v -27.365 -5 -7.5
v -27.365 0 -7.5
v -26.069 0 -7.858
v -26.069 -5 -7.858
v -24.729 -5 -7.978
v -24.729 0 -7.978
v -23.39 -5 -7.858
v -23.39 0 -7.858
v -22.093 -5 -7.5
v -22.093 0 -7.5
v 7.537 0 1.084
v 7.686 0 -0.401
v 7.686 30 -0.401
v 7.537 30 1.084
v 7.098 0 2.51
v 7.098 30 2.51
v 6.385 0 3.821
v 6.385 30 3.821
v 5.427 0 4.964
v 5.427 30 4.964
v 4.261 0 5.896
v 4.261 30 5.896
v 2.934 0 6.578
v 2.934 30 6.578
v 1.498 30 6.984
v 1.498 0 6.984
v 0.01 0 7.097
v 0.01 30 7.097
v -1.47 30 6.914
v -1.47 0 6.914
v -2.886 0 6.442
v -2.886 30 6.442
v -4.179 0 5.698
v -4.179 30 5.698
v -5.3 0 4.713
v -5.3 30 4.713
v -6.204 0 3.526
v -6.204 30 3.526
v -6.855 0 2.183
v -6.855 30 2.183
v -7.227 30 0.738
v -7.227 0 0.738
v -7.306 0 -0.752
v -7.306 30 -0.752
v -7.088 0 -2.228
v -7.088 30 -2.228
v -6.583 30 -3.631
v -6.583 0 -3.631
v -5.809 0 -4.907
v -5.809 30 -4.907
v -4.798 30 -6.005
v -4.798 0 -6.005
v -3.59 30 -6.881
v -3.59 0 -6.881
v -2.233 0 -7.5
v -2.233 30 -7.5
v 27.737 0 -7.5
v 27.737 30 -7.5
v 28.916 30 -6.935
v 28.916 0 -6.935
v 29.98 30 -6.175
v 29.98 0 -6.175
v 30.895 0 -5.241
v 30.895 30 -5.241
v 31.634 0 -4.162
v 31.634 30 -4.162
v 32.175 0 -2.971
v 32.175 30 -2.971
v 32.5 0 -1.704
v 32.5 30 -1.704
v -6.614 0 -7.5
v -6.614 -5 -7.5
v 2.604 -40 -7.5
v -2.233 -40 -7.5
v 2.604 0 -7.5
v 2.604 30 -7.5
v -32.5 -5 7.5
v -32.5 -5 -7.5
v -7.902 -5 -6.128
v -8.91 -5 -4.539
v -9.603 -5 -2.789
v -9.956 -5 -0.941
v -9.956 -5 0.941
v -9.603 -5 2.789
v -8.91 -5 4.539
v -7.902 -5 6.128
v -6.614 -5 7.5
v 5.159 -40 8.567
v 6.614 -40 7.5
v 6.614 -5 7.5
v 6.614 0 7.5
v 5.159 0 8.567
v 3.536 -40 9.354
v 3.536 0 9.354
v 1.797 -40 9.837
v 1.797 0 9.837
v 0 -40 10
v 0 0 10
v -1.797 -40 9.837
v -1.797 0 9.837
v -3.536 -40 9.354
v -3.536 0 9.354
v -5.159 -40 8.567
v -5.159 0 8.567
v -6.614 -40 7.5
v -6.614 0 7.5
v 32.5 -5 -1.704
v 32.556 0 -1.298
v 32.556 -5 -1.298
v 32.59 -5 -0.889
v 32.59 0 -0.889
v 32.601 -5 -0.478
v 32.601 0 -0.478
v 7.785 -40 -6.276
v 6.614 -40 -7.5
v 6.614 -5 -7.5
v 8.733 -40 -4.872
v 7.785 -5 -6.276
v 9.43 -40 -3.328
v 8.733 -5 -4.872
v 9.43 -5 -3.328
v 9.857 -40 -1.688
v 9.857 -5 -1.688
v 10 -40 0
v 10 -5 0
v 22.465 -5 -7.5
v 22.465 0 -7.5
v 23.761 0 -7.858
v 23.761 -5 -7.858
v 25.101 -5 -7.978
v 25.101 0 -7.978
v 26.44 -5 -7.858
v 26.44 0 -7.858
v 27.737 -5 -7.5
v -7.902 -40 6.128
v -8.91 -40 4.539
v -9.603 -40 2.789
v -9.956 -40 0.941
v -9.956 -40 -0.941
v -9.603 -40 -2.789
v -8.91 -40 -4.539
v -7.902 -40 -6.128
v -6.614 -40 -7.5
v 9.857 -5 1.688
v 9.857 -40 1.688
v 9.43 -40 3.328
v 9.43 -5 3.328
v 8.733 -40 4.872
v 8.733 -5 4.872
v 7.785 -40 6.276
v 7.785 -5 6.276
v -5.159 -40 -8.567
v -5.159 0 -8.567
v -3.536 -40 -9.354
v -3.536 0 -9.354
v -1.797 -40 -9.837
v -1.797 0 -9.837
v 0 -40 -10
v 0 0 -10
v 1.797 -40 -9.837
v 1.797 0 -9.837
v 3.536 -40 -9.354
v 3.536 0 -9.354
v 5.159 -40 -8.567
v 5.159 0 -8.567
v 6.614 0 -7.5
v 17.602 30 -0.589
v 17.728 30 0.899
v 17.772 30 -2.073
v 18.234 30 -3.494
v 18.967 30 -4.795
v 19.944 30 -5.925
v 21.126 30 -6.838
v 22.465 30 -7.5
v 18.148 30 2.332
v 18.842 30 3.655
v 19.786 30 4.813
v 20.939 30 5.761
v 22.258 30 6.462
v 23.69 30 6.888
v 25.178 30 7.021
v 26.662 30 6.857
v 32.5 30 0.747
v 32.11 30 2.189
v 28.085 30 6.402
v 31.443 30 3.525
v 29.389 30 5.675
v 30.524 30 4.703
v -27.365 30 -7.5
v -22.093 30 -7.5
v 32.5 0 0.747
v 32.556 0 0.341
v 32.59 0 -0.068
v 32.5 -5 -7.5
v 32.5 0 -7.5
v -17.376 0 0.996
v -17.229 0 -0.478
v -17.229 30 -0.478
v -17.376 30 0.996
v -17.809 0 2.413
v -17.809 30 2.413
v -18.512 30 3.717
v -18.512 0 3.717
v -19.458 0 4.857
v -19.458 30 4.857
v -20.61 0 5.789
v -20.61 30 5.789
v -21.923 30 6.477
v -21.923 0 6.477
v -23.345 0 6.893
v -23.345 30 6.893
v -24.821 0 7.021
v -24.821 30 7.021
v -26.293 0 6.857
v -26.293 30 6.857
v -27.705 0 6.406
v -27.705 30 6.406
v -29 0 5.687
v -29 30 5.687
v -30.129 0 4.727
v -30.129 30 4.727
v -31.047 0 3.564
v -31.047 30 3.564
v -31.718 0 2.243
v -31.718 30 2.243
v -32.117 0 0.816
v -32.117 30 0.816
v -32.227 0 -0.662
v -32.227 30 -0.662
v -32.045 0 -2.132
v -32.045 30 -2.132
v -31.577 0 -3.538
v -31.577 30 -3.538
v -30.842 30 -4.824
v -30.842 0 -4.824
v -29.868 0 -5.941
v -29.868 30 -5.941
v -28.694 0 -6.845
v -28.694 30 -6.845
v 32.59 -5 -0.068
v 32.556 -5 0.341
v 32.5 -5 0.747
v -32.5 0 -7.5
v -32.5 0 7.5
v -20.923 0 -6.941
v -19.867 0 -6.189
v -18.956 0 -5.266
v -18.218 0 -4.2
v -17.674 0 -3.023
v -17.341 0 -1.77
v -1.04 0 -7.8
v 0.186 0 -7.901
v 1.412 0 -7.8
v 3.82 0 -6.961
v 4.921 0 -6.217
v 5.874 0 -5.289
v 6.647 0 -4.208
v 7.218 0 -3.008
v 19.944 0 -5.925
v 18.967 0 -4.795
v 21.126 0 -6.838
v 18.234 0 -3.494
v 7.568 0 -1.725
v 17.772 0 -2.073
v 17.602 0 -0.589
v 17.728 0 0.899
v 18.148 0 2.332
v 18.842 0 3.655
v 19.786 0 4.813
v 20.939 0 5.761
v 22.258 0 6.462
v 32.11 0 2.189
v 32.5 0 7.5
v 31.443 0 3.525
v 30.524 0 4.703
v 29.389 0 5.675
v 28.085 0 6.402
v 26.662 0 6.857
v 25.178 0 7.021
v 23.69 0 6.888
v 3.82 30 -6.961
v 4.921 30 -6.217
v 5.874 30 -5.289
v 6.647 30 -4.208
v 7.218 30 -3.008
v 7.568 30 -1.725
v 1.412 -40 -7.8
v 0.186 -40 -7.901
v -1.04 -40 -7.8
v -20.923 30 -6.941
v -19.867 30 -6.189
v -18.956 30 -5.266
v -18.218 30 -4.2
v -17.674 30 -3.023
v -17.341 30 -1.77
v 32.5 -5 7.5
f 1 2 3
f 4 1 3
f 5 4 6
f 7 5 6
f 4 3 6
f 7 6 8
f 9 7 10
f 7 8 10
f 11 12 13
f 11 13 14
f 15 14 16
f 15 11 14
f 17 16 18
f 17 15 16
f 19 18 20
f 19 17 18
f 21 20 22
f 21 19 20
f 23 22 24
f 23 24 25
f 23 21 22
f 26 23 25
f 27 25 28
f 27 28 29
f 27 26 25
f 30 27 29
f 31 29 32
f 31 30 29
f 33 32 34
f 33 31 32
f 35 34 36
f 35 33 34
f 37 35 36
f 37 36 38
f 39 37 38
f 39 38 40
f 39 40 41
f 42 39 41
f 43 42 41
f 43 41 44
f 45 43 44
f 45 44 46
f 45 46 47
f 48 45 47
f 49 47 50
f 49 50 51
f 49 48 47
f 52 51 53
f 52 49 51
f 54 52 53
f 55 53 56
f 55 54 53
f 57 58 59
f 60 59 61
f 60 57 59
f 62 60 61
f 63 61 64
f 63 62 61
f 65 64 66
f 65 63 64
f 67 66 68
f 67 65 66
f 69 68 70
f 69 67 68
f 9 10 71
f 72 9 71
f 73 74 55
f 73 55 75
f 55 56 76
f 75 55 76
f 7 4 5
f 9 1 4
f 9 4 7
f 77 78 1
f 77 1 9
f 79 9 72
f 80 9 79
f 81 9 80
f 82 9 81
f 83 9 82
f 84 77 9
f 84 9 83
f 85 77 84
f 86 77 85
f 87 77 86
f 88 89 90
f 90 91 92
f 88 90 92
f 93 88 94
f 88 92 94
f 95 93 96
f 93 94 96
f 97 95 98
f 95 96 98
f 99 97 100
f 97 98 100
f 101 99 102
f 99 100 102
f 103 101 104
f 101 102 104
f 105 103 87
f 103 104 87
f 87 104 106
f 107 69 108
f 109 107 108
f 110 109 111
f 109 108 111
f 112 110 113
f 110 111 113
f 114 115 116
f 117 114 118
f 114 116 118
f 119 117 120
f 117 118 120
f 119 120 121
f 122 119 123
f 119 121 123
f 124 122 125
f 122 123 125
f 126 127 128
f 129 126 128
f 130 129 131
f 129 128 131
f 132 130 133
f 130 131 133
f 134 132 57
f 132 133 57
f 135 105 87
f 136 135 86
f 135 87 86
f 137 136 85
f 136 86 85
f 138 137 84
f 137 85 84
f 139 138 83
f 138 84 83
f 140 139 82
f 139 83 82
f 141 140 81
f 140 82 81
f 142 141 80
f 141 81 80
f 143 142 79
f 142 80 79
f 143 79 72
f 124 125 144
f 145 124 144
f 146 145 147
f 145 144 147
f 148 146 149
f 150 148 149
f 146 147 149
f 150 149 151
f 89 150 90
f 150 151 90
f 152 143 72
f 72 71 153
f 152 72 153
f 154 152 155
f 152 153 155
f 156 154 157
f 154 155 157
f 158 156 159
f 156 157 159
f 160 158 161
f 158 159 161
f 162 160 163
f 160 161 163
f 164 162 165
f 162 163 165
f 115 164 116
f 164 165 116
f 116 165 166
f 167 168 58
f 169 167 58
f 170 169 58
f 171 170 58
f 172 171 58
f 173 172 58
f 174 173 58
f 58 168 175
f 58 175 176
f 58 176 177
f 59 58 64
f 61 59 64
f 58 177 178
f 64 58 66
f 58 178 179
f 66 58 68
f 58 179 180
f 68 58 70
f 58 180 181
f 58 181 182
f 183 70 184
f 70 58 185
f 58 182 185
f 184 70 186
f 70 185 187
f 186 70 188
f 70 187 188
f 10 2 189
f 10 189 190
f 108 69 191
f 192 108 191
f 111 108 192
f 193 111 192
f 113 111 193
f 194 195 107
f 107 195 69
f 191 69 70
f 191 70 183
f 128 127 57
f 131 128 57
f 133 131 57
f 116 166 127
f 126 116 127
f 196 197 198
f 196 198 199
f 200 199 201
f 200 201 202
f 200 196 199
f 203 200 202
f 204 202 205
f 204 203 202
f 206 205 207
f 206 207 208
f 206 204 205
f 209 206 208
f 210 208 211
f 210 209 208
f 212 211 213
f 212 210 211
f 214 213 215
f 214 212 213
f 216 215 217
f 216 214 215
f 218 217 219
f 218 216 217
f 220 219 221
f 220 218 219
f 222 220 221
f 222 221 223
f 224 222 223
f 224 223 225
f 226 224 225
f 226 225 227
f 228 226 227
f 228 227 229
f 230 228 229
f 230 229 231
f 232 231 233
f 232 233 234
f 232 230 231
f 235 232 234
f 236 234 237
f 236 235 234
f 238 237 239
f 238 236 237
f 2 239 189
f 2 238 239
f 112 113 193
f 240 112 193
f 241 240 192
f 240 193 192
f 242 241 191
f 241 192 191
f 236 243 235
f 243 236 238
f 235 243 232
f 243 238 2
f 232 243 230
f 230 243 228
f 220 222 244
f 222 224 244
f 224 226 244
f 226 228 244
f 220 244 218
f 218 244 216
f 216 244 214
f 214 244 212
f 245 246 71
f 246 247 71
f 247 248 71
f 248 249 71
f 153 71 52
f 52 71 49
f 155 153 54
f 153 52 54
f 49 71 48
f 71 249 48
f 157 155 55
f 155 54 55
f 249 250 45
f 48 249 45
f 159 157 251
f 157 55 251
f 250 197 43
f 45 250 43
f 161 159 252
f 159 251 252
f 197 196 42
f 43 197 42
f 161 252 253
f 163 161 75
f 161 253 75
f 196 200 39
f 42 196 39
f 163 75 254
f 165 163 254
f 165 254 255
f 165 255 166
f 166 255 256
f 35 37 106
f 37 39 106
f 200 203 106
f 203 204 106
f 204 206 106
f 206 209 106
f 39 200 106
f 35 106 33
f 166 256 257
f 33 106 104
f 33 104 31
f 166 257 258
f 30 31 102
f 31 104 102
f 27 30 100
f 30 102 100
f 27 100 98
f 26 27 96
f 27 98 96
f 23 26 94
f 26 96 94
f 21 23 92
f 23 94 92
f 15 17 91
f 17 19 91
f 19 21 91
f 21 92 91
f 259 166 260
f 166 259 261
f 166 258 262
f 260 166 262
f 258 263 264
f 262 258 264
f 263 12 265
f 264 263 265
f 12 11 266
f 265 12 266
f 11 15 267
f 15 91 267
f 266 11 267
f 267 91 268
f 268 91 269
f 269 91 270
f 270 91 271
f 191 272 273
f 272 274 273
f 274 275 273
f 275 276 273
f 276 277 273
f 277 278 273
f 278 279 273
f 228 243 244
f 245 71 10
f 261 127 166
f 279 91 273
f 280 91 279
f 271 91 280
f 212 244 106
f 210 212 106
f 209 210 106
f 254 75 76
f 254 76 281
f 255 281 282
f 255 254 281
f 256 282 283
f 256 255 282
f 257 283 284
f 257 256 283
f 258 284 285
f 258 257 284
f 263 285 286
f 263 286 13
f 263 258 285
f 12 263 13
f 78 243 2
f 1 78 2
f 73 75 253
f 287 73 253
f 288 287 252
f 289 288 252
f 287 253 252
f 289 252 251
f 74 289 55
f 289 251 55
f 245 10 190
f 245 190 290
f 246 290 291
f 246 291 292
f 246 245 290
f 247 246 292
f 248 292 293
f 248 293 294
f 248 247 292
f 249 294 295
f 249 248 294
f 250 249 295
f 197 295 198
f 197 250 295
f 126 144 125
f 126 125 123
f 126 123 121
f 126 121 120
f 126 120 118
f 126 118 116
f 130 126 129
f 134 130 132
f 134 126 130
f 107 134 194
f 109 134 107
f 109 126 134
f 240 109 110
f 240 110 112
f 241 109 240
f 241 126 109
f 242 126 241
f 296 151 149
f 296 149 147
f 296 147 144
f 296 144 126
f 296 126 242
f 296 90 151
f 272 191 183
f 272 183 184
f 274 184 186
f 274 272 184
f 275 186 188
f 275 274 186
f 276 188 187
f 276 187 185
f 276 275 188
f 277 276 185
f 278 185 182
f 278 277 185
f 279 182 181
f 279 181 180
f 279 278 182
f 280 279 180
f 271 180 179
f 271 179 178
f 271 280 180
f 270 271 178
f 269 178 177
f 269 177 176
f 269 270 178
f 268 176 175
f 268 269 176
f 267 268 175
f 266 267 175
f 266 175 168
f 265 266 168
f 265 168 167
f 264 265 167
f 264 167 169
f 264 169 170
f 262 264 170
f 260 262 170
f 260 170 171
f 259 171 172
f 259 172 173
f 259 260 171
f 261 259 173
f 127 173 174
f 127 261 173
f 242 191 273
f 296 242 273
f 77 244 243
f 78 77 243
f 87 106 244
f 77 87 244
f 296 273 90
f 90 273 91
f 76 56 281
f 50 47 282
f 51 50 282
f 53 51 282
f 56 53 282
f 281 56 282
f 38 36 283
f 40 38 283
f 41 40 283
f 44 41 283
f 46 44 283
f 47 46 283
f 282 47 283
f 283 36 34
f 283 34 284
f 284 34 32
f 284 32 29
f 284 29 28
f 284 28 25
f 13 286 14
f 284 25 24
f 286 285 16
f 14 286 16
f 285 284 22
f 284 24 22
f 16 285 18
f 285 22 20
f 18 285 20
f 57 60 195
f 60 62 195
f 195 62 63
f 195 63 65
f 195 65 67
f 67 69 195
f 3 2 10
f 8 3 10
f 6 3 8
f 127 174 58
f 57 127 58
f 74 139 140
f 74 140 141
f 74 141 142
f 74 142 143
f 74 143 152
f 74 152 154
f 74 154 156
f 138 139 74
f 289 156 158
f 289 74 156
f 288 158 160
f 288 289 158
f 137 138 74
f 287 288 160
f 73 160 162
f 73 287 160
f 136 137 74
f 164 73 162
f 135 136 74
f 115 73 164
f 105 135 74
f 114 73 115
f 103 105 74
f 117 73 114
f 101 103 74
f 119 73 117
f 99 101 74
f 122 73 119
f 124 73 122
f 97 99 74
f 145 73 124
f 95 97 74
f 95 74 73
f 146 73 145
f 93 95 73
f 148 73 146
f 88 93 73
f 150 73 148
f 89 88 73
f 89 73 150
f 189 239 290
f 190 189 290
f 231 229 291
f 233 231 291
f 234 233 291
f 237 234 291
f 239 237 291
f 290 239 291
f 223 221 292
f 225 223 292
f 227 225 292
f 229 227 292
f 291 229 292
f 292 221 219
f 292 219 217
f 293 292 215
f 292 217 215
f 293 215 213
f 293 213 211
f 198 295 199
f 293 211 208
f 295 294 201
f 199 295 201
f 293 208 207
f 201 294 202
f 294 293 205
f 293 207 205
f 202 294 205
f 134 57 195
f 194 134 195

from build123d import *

# Parameters (mm, degrees)
F1_DEPTH = 5
F2_DEPTH = 40
F3_DEPTH = 30


with BuildPart() as f1:
    # F0 (on Front) → F1 (new body)
    with BuildSketch(Plane.XZ):
        with BuildLine():
            Line((-22.0933434024, -7.5), (-27.3651991933, -7.5))
            ThreePointArc((-27.3651991933, -7.5), (-24.7292712978, -7.9784699581), (-22.0933434024, -7.5))
        make_face()
        with BuildLine():
            Line((27.7367906295, -7.5), (22.4649348386, -7.5))
            ThreePointArc((22.4649348386, -7.5), (25.1008627341, -7.9784699581), (27.7367906295, -7.5))
        make_face()
        with BuildLine():
            Line((32.5, -7.5), (32.5, -1.7043442256))
            ThreePointArc((32.5, -1.7043442256), (30.8950874158, -5.2405031728), (27.7367906295, -7.5))
            Line((27.7367906295, -7.5), (32.5, -7.5))
        make_face()
        with BuildLine():
            ThreePointArc((32.6008627341, -0.4784699581), (32.5756045187, 0.1365383775), (32.5, 0.7474043095))
            Line((32.5, 0.7474043095), (32.5, -1.7043442256))
            ThreePointArc((32.5, -1.7043442256), (32.5756045187, -1.0934782936), (32.6008627341, -0.4784699581))
        make_face()
        with BuildLine():
            Line((32.5, 7.5), (6.6143782777, 7.5))
            ThreePointArc((6.6143782777, 7.5), (9.1143782777, 4.1143782777), (10, 0))
            ThreePointArc((10, 0), (9.1143782777, -4.1143782777), (6.6143782777, -7.5))
            Line((6.6143782777, -7.5), (22.4649348386, -7.5))
            ThreePointArc((22.4649348386, -7.5), (20.3388295194, 5.3157547236), (32.5, 0.7474043095))
            Line((32.5, 0.7474043095), (32.5, 7.5))
        make_face()
        with BuildLine():
            Line((6.6143782777, 7.5), (-6.6143782777, 7.5))
            ThreePointArc((-6.6143782777, 7.5), (-10, 0), (-6.6143782777, -7.5))
            Line((-6.6143782777, -7.5), (-2.2328131871, -7.5))
            ThreePointArc((-2.2328131871, -7.5), (-4.1794324094, 5.698071659), (7.6857957181, -0.4006809507))
            ThreePointArc((7.6857957181, -0.4006809507), (6.2845483278, -4.7659090782), (2.6044046233, -7.5))
            Line((2.6044046233, -7.5), (6.6143782777, -7.5))
            ThreePointArc((6.6143782777, -7.5), (9.1143782777, -4.1143782777), (10, 0))
            ThreePointArc((10, 0), (9.1143782777, 4.1143782777), (6.6143782777, 7.5))
        make_face()
        with BuildLine():
            Line((-6.6143782777, 7.5), (-32.5, 7.5))
            Line((-32.5, 7.5), (-32.5, -7.5))
            Line((-32.5, -7.5), (-27.3651991933, -7.5))
            ThreePointArc((-27.3651991933, -7.5), (-29.0001342542, 5.6867331698), (-17.2292712978, -0.4784699581))
            ThreePointArc((-17.2292712978, -0.4784699581), (-18.56406817, -4.7493329144), (-22.0933434024, -7.5))
            Line((-22.0933434024, -7.5), (-6.6143782777, -7.5))
            ThreePointArc((-6.6143782777, -7.5), (-10, 0), (-6.6143782777, 7.5))
        make_face()
        with BuildLine():
            ThreePointArc((7.6857957181, -0.4006809507), (-4.1794324094, 5.698071659), (-2.2328131871, -7.5))
            Line((-2.2328131871, -7.5), (2.6044046233, -7.5))
            ThreePointArc((2.6044046233, -7.5), (6.2845483278, -4.7659090782), (7.6857957181, -0.4006809507))
        make_face()
        with BuildLine():
            ThreePointArc((-17.2292712978, -0.4784699581), (-29.0001342542, 5.6867331698), (-27.3651991933, -7.5))
            Line((-27.3651991933, -7.5), (-22.0933434024, -7.5))
            ThreePointArc((-22.0933434024, -7.5), (-18.56406817, -4.7493329144), (-17.2292712978, -0.4784699581))
        make_face()
        with BuildLine():
            Line((32.5, -1.7043442256), (32.5, 0.7474043095))
            ThreePointArc((32.5, 0.7474043095), (20.3388295194, 5.3157547236), (22.4649348386, -7.5))
            Line((22.4649348386, -7.5), (27.7367906295, -7.5))
            ThreePointArc((27.7367906295, -7.5), (30.8950874158, -5.2405031728), (32.5, -1.7043442256))
        make_face()
    extrude(amount=F1_DEPTH)

    # F0 (on Front) → F2 (join)
    with BuildSketch(Plane.XZ):
        with BuildLine():
            ThreePointArc((7.6857957181, -0.4006809507), (-4.1794324094, 5.698071659), (-2.2328131871, -7.5))
            Line((-2.2328131871, -7.5), (2.6044046233, -7.5))
            ThreePointArc((2.6044046233, -7.5), (6.2845483278, -4.7659090782), (7.6857957181, -0.4006809507))
        make_face()
        with BuildLine():
            ThreePointArc((6.6143782777, 7.5), (0, 10), (-6.6143782777, 7.5))
            Line((-6.6143782777, 7.5), (6.6143782777, 7.5))
        make_face()
        with BuildLine():
            Line((-2.2328131871, -7.5), (-6.6143782777, -7.5))
            ThreePointArc((-6.6143782777, -7.5), (0, -10), (6.6143782777, -7.5))
            Line((6.6143782777, -7.5), (2.6044046233, -7.5))
            ThreePointArc((2.6044046233, -7.5), (0.1857957181, -7.9006809507), (-2.2328131871, -7.5))
        make_face()
        with BuildLine():
            Line((6.6143782777, 7.5), (-6.6143782777, 7.5))
            ThreePointArc((-6.6143782777, 7.5), (-10, 0), (-6.6143782777, -7.5))
            Line((-6.6143782777, -7.5), (-2.2328131871, -7.5))
            ThreePointArc((-2.2328131871, -7.5), (-4.1794324094, 5.698071659), (7.6857957181, -0.4006809507))
            ThreePointArc((7.6857957181, -0.4006809507), (6.2845483278, -4.7659090782), (2.6044046233, -7.5))
            Line((2.6044046233, -7.5), (6.6143782777, -7.5))
            ThreePointArc((6.6143782777, -7.5), (9.1143782777, -4.1143782777), (10, 0))
            ThreePointArc((10, 0), (9.1143782777, 4.1143782777), (6.6143782777, 7.5))
        make_face()
    extrude(amount=F2_DEPTH)

    # F0 (on Front) → F3 (join)
    with BuildSketch(Plane.XZ):
        with BuildLine():
            Line((32.5, -1.7043442256), (32.5, 0.7474043095))
            ThreePointArc((32.5, 0.7474043095), (20.3388295194, 5.3157547236), (22.4649348386, -7.5))
            Line((22.4649348386, -7.5), (27.7367906295, -7.5))
            ThreePointArc((27.7367906295, -7.5), (30.8950874158, -5.2405031728), (32.5, -1.7043442256))
        make_face()
        with BuildLine():
            ThreePointArc((-17.2292712978, -0.4784699581), (-29.0001342542, 5.6867331698), (-27.3651991933, -7.5))
            Line((-27.3651991933, -7.5), (-22.0933434024, -7.5))
            ThreePointArc((-22.0933434024, -7.5), (-18.56406817, -4.7493329144), (-17.2292712978, -0.4784699581))
        make_face()
        with BuildLine():
            ThreePointArc((7.6857957181, -0.4006809507), (-4.1794324094, 5.698071659), (-2.2328131871, -7.5))
            Line((-2.2328131871, -7.5), (2.6044046233, -7.5))
            ThreePointArc((2.6044046233, -7.5), (6.2845483278, -4.7659090782), (7.6857957181, -0.4006809507))
        make_face()
    extrude(amount=-F3_DEPTH)


solid = f1.part
